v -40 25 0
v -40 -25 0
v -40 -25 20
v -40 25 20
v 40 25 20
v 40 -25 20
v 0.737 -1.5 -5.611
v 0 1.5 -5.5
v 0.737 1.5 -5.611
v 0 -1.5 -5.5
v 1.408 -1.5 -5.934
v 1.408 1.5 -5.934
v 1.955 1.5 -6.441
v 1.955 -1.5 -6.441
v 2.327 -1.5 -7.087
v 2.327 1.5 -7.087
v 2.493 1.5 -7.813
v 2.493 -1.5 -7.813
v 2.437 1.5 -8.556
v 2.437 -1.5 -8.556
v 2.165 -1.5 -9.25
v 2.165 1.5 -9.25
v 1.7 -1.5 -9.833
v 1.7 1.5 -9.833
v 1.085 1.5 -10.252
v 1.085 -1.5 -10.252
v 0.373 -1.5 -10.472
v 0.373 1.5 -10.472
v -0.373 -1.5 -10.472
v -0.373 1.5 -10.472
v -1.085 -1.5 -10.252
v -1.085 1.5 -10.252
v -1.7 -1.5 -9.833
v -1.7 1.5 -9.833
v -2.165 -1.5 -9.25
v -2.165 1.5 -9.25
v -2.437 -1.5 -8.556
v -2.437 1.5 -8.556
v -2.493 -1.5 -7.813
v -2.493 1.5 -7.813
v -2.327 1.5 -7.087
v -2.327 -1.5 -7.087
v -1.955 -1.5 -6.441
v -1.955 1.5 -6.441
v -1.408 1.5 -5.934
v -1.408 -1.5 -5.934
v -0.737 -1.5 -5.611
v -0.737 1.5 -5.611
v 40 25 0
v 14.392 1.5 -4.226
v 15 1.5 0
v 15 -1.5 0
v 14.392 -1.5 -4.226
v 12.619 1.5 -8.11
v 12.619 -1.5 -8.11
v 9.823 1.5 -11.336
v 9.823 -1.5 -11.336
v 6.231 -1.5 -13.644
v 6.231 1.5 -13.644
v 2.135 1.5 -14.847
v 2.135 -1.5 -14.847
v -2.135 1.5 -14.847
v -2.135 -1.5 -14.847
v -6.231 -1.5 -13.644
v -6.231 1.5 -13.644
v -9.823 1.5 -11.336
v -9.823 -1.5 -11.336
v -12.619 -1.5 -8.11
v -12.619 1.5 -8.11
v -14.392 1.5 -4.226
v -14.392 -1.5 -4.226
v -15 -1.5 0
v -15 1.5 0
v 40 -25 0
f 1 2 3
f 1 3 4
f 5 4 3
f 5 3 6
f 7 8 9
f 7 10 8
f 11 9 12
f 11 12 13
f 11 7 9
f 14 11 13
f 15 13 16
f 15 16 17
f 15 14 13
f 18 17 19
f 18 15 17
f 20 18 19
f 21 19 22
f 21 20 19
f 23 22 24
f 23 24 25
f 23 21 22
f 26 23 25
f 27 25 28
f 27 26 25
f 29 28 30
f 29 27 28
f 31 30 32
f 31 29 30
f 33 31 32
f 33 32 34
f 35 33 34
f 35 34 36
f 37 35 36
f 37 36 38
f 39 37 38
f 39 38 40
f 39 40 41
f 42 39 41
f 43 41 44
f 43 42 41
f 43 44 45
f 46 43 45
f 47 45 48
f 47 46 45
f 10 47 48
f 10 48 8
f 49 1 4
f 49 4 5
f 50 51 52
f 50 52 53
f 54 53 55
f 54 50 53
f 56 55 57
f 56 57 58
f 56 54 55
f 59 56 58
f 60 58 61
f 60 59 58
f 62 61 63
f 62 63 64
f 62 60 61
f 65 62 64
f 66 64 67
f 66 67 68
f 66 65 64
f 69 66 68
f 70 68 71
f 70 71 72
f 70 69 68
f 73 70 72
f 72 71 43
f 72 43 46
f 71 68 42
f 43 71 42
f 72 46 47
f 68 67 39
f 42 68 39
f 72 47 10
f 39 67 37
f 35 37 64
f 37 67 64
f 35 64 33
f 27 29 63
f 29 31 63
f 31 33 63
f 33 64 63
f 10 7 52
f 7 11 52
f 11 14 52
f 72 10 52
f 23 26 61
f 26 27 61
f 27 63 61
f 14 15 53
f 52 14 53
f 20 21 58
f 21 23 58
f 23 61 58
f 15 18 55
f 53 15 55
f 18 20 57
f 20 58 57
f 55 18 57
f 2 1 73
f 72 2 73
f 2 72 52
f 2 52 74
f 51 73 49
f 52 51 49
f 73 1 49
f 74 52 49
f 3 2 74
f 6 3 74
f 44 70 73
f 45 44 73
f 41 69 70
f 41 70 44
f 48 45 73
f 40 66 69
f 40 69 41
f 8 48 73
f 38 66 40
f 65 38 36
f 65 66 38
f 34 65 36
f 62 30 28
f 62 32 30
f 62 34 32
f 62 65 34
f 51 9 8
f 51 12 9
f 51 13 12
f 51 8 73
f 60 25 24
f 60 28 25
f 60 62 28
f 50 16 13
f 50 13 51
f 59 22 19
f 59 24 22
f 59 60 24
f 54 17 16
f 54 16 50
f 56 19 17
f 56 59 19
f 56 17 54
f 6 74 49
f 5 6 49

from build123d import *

# Parameters (mm, degrees)
SKETCH_1_W      = 80
SKETCH_1_H      = 50
EXTRUDE_1_DEPTH = 20
SKETCH_2_R      = 2.5
EXTRUDE_2_DEPTH = 1.5


with BuildPart() as part:
    # 草图1 → 凸台-拉伸1 (new body)
    with BuildSketch(Plane.XY):
        Rectangle(SKETCH_1_W, SKETCH_1_H)
    extrude(amount=EXTRUDE_1_DEPTH)

    # 草图2 → 凸台-拉伸2 (add, symmetric)
    with BuildSketch(Plane(origin=(0, 0, 0), x_dir=(1, 0, 0), z_dir=(0, 1, 0))):
        with BuildLine():
            Line((-15, 0), (15, 0))
            ThreePointArc((15, 0), (0, 15), (-15, 0))
        make_face()
        with Locations(Location((0, 8, 0), (0, 0, 270))):
            Circle(SKETCH_2_R, mode=Mode.SUBTRACT)
    extrude(amount=EXTRUDE_2_DEPTH, both=True)


solid = part.part
